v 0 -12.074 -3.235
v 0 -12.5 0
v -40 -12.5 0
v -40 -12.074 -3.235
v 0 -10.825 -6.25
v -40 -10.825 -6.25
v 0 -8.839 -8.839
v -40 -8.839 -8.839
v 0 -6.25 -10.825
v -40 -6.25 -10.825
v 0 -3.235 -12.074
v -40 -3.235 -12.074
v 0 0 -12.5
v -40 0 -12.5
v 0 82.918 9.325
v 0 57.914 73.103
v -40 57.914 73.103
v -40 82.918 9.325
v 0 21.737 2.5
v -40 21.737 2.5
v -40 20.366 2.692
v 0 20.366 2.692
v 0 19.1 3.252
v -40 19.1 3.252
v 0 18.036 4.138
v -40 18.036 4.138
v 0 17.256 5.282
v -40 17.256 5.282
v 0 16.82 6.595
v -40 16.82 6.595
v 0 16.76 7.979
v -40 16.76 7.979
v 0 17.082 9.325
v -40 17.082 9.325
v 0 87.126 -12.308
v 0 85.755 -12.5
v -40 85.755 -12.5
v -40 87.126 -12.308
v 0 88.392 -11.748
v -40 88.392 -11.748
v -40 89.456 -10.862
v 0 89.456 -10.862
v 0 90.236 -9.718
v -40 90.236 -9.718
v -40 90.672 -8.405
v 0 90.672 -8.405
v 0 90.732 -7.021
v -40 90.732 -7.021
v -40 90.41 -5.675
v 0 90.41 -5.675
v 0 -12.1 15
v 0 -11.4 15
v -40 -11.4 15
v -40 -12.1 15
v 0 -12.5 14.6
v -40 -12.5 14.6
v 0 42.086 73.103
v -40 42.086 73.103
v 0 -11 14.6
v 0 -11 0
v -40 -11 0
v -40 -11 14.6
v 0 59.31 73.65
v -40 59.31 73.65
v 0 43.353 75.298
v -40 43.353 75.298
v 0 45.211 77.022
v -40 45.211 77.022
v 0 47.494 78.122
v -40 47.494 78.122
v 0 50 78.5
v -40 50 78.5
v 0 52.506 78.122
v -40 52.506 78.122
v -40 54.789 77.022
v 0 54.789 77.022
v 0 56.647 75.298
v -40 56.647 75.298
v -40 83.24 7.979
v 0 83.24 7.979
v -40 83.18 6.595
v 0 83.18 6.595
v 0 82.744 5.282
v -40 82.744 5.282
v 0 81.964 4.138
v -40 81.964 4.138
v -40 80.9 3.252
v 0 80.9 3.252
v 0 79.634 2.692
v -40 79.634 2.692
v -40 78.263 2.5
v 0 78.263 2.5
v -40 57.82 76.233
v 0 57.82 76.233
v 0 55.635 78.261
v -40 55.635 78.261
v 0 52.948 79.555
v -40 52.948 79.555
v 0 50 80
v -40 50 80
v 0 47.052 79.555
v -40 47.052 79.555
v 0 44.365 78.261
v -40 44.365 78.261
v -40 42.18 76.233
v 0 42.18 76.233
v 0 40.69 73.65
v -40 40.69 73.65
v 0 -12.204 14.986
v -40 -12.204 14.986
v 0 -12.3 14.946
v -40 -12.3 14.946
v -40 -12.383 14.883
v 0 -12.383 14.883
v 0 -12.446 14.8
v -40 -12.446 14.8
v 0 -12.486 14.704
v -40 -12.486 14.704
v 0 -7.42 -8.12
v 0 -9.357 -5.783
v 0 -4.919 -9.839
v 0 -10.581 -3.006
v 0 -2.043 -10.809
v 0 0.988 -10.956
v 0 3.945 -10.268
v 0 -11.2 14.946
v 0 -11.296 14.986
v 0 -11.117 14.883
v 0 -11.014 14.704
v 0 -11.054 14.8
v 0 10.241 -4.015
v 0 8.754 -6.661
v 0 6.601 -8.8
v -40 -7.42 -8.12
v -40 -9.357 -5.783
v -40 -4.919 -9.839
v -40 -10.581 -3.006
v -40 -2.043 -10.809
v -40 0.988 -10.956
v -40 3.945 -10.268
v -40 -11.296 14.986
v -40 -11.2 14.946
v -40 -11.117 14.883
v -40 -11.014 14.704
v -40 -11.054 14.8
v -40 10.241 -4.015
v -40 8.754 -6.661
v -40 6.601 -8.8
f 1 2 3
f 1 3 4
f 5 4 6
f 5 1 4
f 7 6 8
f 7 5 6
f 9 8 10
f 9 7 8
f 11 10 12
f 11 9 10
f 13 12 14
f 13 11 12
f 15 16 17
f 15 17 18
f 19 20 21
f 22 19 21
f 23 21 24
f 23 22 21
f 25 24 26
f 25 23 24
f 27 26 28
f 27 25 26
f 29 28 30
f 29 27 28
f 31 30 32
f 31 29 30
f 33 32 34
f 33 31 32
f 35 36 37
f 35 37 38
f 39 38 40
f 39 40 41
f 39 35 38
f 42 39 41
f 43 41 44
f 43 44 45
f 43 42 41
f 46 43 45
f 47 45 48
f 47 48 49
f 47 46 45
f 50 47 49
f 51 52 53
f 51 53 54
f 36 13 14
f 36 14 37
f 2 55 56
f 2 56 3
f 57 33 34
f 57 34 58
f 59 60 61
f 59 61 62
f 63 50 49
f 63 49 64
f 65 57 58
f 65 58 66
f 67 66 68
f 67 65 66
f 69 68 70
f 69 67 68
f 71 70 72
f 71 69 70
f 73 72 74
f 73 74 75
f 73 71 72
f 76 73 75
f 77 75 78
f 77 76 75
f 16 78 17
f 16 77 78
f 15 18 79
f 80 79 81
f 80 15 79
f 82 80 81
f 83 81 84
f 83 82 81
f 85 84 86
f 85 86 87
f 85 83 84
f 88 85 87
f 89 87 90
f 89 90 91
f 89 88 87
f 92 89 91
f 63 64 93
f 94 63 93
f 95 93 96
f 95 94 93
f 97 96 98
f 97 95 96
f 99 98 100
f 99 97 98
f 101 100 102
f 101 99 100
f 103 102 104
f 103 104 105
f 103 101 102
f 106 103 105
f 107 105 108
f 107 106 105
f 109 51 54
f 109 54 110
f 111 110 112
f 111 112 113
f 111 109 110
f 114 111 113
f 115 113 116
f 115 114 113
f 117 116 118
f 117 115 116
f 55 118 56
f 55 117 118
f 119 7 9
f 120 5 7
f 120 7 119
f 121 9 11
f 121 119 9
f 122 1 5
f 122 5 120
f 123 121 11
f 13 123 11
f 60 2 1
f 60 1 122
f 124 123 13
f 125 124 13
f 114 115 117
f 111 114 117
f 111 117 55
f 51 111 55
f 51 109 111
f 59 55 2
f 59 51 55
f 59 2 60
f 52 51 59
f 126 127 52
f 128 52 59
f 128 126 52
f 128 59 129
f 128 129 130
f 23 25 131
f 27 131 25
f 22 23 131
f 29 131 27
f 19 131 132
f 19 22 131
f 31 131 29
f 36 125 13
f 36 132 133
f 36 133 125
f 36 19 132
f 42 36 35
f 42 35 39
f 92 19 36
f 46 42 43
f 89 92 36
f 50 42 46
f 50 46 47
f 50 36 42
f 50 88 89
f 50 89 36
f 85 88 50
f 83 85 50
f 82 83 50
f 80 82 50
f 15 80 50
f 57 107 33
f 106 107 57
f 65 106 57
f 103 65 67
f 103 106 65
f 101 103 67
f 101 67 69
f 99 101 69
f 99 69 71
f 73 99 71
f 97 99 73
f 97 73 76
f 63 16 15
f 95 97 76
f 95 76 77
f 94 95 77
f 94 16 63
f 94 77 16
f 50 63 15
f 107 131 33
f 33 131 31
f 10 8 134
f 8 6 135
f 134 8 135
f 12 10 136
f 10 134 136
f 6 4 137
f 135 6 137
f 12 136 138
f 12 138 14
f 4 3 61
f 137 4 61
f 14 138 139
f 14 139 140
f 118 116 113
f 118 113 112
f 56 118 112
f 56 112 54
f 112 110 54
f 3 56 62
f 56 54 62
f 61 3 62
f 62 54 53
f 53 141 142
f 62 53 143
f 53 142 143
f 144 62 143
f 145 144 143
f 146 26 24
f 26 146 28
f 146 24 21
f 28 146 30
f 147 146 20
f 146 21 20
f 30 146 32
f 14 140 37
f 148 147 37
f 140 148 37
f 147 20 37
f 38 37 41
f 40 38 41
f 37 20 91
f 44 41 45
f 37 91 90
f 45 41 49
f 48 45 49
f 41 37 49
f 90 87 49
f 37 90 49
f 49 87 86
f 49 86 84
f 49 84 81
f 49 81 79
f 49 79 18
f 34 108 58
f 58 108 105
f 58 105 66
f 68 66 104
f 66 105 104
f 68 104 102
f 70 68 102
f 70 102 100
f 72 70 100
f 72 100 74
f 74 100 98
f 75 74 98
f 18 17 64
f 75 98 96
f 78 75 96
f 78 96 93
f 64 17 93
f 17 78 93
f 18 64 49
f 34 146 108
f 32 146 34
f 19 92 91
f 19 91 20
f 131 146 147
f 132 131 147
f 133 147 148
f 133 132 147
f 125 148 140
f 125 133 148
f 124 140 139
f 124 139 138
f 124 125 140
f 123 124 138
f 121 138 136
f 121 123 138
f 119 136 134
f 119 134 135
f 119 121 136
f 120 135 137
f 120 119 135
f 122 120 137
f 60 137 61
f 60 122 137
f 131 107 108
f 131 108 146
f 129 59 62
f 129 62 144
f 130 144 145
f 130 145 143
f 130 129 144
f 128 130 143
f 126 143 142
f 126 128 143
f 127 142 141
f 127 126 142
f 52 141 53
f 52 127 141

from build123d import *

# Parameters (mm, degrees)
F1_DEPTH = 40


with BuildPart() as f1:
    # F0 (on Right) → F1 (new body)
    with BuildSketch(Plane.YZ):
        with BuildLine():
            Line((-12.5, 14.6), (-12.5, 0))
            ThreePointArc((-12.5, 0), (-8.838835, -8.838835), (0, -12.5))
            Line((0, -12.5), (85.754689, -12.5))
            ThreePointArc((85.754689, -12.5), (89.885373, -10.317348), (90.409718, -5.674979))
            Line((90.409718, -5.674979), (59.310059, 73.650042))
            ThreePointArc((59.310059, 73.650042), (50, 80), (40.689941, 73.650042))
            Line((40.689941, 73.650042), (10.241065, -4.015046))
            ThreePointArc((10.241065, -4.015046), (-2.043072, -10.808601), (-11, 0))
            Line((-11, 0), (-11, 14.6))
            ThreePointArc((-11, 14.6), (-11.117157, 14.882843), (-11.4, 15))
            Line((-11.4, 15), (-12.1, 15))
            ThreePointArc((-12.1, 15), (-12.382843, 14.882843), (-12.5, 14.6))
        make_face()
        with BuildLine():
            ThreePointArc((42.08645, 73.102536), (50, 78.5), (57.91355, 73.102536))
            Line((57.91355, 73.102536), (82.917754, 9.325021))
            ThreePointArc((82.917754, 9.325021), (82.393408, 4.682652), (78.262724, 2.5))
            Line((78.262724, 2.5), (21.737276, 2.5))
            ThreePointArc((21.737276, 2.5), (17.606592, 4.682652), (17.082246, 9.325021))
            Line((17.082246, 9.325021), (42.08645, 73.102536))
        make_face(mode=Mode.SUBTRACT)
    extrude(amount=-F1_DEPTH)


solid = f1.part
